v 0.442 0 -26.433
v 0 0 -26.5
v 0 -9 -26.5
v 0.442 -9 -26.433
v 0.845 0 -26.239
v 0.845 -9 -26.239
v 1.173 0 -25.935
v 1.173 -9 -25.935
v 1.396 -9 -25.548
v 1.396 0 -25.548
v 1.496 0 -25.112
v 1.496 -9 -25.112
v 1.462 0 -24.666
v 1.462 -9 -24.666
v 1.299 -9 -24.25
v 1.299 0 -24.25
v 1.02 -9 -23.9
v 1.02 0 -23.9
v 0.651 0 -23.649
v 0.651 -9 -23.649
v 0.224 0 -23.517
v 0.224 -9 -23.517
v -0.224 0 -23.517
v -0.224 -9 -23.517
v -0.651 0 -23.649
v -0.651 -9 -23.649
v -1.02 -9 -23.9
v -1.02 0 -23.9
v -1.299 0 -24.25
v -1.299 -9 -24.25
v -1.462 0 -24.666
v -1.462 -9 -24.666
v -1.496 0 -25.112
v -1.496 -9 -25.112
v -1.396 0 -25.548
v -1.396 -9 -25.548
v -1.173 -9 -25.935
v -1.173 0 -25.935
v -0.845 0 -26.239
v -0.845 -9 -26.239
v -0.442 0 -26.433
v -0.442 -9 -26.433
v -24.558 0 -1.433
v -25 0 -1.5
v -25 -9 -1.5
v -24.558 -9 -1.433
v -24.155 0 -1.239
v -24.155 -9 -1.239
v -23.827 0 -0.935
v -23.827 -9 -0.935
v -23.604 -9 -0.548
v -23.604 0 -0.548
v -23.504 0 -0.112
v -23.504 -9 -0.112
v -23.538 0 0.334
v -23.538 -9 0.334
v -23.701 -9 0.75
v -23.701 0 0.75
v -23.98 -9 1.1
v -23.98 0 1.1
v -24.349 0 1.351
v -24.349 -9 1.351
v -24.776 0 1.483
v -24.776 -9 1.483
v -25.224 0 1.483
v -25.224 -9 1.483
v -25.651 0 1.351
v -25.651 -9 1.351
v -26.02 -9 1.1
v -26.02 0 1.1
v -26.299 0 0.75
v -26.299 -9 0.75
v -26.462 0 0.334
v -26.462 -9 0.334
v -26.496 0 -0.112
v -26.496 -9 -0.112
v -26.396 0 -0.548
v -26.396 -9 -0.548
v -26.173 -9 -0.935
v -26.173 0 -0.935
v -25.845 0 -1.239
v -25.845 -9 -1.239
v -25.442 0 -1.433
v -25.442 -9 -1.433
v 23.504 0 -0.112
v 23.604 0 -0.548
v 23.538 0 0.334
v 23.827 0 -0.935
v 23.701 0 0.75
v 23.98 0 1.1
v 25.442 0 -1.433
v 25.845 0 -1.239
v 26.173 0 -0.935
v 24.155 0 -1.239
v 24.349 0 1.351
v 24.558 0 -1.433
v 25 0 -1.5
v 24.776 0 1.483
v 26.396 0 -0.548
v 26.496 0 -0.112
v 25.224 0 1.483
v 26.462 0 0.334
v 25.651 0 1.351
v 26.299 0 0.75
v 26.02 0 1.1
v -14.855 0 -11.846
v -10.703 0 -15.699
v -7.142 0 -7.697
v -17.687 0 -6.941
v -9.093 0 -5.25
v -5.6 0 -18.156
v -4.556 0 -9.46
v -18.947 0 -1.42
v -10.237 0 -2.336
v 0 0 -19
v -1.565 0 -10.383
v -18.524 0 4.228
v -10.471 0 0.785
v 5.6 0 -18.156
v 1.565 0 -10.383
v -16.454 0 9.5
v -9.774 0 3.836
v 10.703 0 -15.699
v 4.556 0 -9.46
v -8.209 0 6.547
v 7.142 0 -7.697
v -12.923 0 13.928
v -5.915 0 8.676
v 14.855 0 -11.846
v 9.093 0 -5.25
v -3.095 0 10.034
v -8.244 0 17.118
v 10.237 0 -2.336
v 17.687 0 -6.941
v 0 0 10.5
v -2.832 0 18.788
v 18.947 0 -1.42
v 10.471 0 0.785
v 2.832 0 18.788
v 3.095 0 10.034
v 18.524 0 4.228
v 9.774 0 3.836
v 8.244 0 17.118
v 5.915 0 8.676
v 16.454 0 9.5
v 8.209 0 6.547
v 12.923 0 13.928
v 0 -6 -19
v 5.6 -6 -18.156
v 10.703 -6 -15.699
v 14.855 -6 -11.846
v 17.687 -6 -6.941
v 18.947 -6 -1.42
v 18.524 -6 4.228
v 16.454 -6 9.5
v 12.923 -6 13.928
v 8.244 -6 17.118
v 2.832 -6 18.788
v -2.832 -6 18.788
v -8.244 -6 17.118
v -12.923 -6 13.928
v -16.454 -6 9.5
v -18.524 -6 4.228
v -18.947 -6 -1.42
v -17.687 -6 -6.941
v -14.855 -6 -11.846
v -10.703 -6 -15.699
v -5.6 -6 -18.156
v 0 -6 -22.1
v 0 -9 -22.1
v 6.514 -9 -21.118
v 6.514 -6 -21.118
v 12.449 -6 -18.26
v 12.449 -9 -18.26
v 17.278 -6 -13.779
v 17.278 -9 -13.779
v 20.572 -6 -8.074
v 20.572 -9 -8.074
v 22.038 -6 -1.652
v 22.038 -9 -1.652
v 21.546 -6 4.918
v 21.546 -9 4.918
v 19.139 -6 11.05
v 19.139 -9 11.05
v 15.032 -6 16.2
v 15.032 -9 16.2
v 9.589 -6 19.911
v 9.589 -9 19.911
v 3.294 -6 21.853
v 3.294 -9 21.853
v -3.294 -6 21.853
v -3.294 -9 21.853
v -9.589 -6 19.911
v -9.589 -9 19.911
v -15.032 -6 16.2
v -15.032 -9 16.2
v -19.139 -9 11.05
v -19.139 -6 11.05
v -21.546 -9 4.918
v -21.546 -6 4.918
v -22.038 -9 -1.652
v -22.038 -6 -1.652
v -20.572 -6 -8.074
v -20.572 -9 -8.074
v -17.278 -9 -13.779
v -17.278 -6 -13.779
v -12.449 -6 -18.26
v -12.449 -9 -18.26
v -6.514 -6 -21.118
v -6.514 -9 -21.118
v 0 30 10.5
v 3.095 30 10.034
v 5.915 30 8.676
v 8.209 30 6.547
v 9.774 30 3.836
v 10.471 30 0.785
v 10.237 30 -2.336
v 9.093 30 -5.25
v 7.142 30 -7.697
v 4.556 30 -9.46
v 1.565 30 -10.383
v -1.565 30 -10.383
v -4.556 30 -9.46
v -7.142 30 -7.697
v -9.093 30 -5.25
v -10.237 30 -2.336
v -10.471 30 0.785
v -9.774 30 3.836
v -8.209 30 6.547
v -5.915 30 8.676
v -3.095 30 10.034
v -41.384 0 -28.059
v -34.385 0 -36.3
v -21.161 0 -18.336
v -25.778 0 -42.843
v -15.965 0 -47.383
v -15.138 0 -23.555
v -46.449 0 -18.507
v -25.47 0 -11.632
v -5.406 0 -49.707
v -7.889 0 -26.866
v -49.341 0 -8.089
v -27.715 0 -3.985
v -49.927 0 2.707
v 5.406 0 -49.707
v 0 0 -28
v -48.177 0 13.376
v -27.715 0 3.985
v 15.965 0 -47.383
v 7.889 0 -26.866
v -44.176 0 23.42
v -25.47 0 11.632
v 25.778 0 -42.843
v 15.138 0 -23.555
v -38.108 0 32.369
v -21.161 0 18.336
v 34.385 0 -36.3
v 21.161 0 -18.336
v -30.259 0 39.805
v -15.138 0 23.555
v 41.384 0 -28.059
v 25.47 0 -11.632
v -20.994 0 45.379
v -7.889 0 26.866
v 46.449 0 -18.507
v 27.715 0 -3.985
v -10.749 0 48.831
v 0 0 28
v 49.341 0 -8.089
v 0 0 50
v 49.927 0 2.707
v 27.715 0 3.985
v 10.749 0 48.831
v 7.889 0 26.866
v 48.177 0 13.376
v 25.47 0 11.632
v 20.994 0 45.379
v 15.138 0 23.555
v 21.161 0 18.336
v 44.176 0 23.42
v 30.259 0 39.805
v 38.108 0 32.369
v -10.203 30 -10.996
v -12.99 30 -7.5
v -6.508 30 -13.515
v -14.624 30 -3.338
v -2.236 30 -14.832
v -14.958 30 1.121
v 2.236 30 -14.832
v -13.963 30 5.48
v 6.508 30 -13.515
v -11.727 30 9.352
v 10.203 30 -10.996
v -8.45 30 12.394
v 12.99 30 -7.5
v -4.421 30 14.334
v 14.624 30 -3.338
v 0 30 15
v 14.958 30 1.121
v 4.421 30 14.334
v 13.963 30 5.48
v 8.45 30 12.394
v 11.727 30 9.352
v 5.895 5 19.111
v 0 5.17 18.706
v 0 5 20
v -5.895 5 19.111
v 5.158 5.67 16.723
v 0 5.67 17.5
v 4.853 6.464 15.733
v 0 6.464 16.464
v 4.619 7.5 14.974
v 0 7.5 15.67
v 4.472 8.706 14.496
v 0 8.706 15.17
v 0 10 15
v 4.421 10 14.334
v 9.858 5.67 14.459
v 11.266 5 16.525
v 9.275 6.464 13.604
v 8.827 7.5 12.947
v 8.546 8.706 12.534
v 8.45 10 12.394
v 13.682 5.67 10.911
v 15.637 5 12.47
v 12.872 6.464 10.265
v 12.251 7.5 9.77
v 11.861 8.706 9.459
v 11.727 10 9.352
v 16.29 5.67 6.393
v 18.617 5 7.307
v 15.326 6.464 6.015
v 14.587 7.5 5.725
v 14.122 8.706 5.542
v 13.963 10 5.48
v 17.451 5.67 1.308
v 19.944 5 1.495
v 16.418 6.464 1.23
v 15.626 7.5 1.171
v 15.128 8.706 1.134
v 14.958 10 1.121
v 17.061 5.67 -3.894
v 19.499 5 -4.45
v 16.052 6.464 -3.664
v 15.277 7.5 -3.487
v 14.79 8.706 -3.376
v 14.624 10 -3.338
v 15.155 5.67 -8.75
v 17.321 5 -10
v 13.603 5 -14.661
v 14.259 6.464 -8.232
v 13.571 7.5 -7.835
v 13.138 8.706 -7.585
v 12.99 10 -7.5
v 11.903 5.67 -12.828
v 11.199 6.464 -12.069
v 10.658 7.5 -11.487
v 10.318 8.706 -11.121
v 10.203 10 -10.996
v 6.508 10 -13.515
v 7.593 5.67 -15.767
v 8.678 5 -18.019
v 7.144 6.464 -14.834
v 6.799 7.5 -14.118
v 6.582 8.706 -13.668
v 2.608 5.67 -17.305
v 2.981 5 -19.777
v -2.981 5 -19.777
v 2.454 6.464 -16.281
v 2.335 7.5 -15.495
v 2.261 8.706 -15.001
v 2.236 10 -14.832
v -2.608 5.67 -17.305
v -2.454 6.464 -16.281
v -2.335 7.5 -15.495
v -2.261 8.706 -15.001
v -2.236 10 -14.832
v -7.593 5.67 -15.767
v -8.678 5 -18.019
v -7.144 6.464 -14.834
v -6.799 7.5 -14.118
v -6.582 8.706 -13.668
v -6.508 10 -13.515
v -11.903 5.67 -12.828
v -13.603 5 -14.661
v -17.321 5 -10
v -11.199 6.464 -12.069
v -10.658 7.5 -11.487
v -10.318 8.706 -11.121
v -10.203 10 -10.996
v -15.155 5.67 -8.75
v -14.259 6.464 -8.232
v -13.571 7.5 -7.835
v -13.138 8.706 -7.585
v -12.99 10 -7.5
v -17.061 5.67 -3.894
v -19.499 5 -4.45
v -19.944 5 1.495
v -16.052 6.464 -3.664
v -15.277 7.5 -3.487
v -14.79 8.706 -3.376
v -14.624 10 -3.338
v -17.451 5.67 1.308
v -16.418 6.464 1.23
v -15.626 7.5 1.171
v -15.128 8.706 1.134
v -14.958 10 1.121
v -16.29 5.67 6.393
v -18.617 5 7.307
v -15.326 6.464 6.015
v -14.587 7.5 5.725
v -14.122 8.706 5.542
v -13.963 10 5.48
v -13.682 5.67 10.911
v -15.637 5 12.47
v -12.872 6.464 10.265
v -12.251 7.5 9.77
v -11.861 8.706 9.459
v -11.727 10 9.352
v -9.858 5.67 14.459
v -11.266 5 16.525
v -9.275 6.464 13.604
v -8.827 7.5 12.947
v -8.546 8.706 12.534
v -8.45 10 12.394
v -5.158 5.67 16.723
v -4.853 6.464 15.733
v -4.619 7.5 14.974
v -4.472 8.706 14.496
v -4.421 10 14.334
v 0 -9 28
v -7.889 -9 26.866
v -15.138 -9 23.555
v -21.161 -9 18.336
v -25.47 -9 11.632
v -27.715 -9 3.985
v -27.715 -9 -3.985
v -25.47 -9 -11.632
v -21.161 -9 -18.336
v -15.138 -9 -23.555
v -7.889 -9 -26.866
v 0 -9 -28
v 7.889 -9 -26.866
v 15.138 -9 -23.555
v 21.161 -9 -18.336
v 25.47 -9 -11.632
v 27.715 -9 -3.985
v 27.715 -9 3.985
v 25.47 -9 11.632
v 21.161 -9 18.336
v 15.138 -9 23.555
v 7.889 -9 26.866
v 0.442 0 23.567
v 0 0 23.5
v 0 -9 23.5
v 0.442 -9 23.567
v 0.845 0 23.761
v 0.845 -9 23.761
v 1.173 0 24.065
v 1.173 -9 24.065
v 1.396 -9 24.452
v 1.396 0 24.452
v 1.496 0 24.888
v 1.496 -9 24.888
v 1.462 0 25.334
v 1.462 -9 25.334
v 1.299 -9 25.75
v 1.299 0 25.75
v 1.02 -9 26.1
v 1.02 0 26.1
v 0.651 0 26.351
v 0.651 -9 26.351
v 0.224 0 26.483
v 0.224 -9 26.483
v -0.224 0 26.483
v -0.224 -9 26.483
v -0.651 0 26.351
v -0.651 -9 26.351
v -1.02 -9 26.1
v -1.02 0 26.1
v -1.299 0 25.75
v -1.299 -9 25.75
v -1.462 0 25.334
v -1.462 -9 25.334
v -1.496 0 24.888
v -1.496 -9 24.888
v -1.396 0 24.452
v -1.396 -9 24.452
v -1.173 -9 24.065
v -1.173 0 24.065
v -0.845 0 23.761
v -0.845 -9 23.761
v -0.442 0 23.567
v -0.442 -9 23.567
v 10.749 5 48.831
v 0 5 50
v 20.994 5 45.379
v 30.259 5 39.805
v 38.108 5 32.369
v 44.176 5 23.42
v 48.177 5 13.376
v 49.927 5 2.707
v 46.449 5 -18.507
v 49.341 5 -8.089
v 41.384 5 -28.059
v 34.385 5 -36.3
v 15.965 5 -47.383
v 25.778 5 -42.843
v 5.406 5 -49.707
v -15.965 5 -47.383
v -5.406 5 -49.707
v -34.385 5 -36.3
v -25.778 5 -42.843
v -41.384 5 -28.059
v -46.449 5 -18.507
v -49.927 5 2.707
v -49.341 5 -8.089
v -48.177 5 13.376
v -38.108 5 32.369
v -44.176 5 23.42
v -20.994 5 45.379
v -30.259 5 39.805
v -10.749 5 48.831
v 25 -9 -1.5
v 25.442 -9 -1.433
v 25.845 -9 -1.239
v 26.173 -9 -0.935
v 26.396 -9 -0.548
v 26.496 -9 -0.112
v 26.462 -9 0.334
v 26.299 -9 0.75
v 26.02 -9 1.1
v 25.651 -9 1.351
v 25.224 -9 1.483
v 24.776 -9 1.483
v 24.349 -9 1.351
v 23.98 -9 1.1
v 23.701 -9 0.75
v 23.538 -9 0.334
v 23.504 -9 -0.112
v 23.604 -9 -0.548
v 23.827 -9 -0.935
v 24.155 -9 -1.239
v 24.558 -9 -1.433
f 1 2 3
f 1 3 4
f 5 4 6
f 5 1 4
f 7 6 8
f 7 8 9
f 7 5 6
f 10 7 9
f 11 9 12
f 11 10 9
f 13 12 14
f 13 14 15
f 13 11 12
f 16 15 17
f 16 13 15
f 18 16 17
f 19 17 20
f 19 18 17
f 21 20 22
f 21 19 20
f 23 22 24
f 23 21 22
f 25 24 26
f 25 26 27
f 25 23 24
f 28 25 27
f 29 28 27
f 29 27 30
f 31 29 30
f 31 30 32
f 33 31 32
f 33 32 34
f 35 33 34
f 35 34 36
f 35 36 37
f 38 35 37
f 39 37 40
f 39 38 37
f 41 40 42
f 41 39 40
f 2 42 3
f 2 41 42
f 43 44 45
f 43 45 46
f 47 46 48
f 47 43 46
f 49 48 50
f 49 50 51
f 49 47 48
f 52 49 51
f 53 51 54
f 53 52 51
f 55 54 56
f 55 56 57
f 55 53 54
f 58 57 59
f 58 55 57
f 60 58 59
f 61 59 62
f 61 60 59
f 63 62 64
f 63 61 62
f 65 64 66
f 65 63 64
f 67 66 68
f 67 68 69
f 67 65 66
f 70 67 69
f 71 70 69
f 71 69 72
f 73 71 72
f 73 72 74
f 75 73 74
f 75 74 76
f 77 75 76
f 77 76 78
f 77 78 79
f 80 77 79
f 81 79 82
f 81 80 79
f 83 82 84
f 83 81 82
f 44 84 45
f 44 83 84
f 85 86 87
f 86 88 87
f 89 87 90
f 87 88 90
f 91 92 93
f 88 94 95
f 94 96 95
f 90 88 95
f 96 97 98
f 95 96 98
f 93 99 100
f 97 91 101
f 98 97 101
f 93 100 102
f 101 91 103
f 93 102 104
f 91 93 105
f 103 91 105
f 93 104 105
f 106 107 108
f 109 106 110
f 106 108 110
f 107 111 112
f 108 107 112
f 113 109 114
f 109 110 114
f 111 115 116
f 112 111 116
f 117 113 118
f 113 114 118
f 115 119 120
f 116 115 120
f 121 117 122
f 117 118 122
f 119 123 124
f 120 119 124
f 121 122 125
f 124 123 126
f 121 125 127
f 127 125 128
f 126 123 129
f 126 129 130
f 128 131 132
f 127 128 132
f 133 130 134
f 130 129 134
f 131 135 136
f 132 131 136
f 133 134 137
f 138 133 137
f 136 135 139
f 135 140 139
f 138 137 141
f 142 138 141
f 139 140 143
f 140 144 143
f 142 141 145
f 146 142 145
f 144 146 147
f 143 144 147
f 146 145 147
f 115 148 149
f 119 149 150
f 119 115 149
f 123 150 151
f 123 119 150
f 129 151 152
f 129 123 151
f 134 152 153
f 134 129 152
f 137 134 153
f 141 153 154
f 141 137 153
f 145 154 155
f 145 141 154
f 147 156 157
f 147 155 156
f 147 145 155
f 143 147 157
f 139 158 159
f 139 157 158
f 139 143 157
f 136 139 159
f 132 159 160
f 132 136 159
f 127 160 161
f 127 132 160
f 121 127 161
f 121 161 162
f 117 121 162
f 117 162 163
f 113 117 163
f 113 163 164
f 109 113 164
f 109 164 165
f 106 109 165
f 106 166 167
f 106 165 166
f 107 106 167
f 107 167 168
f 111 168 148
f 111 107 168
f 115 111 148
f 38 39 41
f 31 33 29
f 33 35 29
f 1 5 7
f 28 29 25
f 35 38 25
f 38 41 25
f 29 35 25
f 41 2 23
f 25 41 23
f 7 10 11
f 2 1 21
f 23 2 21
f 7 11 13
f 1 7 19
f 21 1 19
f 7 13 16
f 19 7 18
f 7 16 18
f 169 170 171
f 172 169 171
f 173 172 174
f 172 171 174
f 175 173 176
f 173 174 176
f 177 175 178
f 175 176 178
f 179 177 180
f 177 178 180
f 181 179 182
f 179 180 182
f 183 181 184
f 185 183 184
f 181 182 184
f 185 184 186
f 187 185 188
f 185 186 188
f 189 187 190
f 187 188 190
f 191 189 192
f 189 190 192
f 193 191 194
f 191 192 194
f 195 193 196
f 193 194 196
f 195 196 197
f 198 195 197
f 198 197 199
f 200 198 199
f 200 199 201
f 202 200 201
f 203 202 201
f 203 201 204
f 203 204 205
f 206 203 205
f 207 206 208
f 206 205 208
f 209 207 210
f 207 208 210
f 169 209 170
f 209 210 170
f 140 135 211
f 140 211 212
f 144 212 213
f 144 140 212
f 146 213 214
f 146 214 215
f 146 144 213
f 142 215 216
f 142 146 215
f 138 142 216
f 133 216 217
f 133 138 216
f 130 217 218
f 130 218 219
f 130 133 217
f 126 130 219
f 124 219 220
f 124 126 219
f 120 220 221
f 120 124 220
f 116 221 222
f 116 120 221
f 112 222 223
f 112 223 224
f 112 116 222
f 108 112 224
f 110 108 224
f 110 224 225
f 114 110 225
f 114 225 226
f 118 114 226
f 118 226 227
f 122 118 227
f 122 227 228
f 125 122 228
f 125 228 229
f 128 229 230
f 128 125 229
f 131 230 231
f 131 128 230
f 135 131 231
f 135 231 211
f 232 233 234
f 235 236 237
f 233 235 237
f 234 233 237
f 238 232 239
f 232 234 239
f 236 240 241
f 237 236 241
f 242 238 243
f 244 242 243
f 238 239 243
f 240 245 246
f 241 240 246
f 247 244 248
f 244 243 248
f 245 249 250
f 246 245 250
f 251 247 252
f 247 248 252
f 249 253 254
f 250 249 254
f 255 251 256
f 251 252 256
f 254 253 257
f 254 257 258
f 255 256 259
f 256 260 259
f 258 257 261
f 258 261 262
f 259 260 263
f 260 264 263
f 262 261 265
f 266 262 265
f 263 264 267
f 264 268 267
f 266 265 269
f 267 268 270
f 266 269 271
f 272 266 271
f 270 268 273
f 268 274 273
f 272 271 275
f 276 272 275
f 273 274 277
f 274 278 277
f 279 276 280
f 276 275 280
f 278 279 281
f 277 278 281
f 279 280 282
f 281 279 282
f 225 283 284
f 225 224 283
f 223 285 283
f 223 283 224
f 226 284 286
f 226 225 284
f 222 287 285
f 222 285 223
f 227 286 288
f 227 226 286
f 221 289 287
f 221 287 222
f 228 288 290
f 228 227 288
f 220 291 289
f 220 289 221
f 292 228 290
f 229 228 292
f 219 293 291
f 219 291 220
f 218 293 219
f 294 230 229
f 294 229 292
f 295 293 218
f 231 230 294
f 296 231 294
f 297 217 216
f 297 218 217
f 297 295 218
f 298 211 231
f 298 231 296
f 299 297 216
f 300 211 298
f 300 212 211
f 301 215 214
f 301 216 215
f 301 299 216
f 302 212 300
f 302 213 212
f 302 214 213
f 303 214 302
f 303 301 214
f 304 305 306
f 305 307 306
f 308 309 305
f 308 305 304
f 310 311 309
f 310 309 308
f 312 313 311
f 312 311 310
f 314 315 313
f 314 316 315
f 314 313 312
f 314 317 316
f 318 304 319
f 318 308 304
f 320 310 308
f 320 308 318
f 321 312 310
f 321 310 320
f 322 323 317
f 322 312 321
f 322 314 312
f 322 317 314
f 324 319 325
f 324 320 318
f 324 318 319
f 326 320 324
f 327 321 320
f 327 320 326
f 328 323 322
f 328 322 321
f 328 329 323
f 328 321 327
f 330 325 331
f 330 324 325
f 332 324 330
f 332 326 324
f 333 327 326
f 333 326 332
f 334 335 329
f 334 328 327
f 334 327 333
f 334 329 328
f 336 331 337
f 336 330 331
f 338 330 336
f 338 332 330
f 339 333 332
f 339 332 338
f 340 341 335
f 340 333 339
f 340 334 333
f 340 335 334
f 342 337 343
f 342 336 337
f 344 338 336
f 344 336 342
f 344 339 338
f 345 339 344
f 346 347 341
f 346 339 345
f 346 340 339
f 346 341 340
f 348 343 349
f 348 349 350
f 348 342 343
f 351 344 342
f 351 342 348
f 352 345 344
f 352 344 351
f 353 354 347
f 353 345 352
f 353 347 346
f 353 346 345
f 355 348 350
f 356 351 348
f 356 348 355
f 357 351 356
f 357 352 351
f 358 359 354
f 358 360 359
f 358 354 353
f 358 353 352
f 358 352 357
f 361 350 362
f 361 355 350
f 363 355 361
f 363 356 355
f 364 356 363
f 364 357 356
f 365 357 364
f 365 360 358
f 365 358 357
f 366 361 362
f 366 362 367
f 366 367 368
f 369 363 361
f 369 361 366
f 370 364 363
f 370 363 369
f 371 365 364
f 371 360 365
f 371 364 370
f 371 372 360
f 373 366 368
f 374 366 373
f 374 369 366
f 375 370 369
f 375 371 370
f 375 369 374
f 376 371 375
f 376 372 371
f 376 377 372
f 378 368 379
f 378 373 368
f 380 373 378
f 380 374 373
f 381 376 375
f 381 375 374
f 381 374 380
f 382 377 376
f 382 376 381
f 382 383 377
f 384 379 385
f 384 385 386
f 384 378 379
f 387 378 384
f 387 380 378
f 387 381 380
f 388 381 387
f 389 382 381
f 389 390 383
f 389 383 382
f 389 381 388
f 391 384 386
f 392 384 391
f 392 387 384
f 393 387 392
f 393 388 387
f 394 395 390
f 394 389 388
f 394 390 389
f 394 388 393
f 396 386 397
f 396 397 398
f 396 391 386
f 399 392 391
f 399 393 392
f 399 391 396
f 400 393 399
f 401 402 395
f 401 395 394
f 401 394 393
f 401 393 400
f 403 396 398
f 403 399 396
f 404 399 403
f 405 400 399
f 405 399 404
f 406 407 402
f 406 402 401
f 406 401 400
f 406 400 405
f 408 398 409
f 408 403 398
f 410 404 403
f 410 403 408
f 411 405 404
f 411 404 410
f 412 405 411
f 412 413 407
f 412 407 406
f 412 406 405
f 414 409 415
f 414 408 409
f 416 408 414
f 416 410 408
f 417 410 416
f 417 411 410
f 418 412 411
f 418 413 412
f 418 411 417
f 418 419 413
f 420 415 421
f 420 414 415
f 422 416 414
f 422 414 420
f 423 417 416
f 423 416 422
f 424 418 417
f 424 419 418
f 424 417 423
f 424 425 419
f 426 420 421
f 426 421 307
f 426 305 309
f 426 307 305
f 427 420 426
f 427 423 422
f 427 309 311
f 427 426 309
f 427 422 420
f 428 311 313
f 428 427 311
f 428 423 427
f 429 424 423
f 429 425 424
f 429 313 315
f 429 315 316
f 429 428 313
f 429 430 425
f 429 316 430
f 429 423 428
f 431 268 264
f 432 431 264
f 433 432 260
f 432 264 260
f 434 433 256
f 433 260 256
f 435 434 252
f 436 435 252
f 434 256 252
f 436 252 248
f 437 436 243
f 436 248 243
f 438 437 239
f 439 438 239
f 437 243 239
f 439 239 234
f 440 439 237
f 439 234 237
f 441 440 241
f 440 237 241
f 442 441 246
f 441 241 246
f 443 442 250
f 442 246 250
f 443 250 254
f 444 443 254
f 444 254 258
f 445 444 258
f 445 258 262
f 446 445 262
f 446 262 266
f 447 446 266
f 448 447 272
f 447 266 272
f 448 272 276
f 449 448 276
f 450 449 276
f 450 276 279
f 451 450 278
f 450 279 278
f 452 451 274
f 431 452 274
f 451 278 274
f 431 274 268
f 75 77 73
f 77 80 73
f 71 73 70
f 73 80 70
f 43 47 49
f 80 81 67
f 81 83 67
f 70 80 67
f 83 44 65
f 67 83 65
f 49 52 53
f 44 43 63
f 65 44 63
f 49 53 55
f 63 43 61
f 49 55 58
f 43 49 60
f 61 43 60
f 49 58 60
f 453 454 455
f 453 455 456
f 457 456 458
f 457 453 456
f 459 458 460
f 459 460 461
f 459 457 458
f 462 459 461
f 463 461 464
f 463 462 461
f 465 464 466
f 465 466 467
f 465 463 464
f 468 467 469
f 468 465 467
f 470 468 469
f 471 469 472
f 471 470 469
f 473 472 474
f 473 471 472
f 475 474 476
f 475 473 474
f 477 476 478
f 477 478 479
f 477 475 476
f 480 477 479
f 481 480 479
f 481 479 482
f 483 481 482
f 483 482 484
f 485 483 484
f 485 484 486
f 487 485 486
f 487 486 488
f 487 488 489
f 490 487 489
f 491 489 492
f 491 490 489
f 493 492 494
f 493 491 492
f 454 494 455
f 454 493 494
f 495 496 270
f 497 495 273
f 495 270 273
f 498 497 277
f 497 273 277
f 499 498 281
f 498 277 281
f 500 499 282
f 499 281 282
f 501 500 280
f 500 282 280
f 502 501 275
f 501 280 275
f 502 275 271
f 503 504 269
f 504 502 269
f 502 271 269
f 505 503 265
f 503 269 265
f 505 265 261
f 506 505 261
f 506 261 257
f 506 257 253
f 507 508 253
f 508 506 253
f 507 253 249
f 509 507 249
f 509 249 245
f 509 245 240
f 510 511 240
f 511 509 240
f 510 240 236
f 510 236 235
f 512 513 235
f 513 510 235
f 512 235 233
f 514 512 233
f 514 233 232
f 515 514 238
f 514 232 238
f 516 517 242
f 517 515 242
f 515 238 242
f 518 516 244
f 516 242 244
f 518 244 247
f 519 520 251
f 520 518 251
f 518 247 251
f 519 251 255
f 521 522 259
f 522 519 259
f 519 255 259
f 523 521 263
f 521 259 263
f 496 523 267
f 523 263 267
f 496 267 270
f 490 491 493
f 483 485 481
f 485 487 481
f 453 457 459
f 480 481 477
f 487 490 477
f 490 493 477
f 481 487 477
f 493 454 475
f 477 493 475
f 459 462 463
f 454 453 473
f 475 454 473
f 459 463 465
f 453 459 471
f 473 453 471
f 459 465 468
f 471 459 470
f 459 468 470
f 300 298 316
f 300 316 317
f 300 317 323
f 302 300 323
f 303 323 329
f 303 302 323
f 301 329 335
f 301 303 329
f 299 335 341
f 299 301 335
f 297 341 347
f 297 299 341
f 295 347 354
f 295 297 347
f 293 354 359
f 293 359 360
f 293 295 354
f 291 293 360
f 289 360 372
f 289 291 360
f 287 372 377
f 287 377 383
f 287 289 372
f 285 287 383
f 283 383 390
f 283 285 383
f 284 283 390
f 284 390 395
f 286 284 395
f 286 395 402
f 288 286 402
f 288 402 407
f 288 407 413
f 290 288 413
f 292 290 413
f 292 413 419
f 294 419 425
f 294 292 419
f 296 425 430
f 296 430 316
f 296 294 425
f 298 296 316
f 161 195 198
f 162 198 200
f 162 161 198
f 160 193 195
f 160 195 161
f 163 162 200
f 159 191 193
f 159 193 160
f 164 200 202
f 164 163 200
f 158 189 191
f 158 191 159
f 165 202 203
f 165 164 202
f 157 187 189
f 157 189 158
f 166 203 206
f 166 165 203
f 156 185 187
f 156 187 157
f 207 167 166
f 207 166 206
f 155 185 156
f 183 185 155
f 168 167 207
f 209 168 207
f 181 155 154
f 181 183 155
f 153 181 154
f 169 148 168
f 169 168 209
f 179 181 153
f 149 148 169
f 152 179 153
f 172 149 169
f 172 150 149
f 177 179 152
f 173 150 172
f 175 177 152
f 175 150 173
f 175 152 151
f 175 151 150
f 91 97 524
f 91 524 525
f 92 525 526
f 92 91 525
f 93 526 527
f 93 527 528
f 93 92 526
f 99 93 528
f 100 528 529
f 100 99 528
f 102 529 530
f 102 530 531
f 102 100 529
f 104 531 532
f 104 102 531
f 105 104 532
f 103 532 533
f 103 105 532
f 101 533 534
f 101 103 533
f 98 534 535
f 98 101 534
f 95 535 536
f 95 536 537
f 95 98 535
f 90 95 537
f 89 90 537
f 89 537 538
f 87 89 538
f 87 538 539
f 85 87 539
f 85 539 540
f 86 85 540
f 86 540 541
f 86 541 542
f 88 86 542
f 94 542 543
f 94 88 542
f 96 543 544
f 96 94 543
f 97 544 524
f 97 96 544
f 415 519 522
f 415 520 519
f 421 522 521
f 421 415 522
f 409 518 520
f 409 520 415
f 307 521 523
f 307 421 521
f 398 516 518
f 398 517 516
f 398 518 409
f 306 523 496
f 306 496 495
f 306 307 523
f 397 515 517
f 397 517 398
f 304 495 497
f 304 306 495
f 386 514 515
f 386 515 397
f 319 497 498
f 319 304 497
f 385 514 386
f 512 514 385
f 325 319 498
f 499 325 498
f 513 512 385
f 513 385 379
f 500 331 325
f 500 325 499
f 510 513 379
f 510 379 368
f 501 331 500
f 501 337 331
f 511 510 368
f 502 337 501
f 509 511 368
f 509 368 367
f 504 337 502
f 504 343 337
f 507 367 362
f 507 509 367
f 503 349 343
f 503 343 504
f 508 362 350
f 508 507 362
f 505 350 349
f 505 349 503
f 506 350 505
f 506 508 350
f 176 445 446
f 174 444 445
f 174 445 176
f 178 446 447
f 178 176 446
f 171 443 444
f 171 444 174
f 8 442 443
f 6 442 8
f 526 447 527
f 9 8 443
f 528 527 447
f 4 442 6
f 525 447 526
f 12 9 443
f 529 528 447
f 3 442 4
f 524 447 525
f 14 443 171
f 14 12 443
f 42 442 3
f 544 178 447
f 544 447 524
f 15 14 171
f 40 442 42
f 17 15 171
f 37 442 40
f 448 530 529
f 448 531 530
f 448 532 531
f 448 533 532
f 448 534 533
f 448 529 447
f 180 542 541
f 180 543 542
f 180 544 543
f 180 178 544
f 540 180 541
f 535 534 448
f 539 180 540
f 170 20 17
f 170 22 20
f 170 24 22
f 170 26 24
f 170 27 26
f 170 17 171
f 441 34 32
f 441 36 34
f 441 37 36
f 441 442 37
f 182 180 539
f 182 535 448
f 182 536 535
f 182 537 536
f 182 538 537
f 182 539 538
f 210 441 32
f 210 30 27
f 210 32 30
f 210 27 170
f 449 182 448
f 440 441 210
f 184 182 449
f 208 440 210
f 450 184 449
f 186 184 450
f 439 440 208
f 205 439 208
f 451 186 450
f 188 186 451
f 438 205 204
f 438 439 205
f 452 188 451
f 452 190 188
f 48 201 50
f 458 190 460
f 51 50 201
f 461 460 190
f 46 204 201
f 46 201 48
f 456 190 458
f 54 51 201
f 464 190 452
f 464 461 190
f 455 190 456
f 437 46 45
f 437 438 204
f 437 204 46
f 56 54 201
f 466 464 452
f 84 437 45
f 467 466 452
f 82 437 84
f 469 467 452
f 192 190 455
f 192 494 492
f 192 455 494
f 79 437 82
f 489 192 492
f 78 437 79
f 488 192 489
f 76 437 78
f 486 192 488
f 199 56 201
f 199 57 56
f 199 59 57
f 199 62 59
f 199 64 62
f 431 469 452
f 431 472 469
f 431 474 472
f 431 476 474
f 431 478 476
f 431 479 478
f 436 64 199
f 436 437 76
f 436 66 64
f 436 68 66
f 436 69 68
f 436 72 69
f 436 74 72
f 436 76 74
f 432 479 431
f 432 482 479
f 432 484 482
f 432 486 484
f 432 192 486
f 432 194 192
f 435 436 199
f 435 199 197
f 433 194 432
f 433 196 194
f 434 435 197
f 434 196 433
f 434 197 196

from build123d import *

# Parameters (mm, degrees)
SKETCH_1_R          = 50
SKETCH_1_R_2        = 10.5
EXTRUDE_1_DEPTH     = 30
SKETCH_2_R          = 54.511418905
SKETCH_2_R_2        = 15
CUT_EXTRUDE_2_DEPTH = 25
SKETCH_3_R          = 28
SKETCH_3_R_2        = 19
SKETCH_3_R_3        = 1.5
EXTRUDE_3_DEPTH     = 9
SKETCH_4_R          = 22.1
CUT_EXTRUDE_4_DEPTH = 3
FILLET_3_R          = 5


with BuildPart() as part:
    # Эскиз1 → Вытянуть1 (new body)
    with BuildSketch(Plane(origin=(0, 0, 0), x_dir=(1, 0, 0), z_dir=(0, 1, 0))):
        with Locations(Location((0, 0, 0), (0, 0, 270))):
            Circle(SKETCH_1_R)
        with Locations(Location((0, 0, 0), (0, 0, 270))):
            Circle(SKETCH_1_R_2, mode=Mode.SUBTRACT)
    extrude(amount=EXTRUDE_1_DEPTH)

    # Эскиз2 → Вытянуть2 (cut)
    with BuildSketch(Plane(origin=(0, 30, 0), x_dir=(1, 0, 0), z_dir=(0, 1, 0))):
        Circle(SKETCH_2_R)
        with Locations(Location((0, 0, 0), (0, 0, 270))):
            Circle(SKETCH_2_R_2, mode=Mode.SUBTRACT)
    extrude(amount=-CUT_EXTRUDE_2_DEPTH, mode=Mode.SUBTRACT)

    # Эскиз3 → Вытянуть3 (add)
    with BuildSketch(Plane.XZ):
        with Locations(Location((0, 0, 0), (0, 0, 90))):
            Circle(SKETCH_3_R)
        with Locations(Location((0, 0, 0), (0, 0, 270))):
            Circle(SKETCH_3_R_2, mode=Mode.SUBTRACT)
        with Locations(Location((0, 25, 0), (0, 0, 270))):
            Circle(SKETCH_3_R_3, mode=Mode.SUBTRACT)
        with Locations(Location((25, 0, 0), (0, 0, 270))):
            Circle(SKETCH_3_R_3, mode=Mode.SUBTRACT)
        with Locations(Location((0, -25, 0), (0, 0, 270))):
            Circle(SKETCH_3_R_3, mode=Mode.SUBTRACT)
        with Locations(Location((-25, 0, 0), (0, 0, 270))):
            Circle(SKETCH_3_R_3, mode=Mode.SUBTRACT)
    extrude(amount=EXTRUDE_3_DEPTH)

    # Эскиз4 → Вытянуть4 (cut)
    with BuildSketch(Plane.XZ.offset(9)):
        with Locations(Location((0, 0, 0), (0, 0, 270))):
            Circle(SKETCH_4_R)
    extrude(amount=-CUT_EXTRUDE_4_DEPTH, mode=Mode.SUBTRACT)

    # Скругление3
    fillet_3_edges = [part.edges().sort_by_distance(p)[0] for p in [
        (0, 5, -15),
    ]]
    fillet(fillet_3_edges, radius=FILLET_3_R)


solid = part.part
